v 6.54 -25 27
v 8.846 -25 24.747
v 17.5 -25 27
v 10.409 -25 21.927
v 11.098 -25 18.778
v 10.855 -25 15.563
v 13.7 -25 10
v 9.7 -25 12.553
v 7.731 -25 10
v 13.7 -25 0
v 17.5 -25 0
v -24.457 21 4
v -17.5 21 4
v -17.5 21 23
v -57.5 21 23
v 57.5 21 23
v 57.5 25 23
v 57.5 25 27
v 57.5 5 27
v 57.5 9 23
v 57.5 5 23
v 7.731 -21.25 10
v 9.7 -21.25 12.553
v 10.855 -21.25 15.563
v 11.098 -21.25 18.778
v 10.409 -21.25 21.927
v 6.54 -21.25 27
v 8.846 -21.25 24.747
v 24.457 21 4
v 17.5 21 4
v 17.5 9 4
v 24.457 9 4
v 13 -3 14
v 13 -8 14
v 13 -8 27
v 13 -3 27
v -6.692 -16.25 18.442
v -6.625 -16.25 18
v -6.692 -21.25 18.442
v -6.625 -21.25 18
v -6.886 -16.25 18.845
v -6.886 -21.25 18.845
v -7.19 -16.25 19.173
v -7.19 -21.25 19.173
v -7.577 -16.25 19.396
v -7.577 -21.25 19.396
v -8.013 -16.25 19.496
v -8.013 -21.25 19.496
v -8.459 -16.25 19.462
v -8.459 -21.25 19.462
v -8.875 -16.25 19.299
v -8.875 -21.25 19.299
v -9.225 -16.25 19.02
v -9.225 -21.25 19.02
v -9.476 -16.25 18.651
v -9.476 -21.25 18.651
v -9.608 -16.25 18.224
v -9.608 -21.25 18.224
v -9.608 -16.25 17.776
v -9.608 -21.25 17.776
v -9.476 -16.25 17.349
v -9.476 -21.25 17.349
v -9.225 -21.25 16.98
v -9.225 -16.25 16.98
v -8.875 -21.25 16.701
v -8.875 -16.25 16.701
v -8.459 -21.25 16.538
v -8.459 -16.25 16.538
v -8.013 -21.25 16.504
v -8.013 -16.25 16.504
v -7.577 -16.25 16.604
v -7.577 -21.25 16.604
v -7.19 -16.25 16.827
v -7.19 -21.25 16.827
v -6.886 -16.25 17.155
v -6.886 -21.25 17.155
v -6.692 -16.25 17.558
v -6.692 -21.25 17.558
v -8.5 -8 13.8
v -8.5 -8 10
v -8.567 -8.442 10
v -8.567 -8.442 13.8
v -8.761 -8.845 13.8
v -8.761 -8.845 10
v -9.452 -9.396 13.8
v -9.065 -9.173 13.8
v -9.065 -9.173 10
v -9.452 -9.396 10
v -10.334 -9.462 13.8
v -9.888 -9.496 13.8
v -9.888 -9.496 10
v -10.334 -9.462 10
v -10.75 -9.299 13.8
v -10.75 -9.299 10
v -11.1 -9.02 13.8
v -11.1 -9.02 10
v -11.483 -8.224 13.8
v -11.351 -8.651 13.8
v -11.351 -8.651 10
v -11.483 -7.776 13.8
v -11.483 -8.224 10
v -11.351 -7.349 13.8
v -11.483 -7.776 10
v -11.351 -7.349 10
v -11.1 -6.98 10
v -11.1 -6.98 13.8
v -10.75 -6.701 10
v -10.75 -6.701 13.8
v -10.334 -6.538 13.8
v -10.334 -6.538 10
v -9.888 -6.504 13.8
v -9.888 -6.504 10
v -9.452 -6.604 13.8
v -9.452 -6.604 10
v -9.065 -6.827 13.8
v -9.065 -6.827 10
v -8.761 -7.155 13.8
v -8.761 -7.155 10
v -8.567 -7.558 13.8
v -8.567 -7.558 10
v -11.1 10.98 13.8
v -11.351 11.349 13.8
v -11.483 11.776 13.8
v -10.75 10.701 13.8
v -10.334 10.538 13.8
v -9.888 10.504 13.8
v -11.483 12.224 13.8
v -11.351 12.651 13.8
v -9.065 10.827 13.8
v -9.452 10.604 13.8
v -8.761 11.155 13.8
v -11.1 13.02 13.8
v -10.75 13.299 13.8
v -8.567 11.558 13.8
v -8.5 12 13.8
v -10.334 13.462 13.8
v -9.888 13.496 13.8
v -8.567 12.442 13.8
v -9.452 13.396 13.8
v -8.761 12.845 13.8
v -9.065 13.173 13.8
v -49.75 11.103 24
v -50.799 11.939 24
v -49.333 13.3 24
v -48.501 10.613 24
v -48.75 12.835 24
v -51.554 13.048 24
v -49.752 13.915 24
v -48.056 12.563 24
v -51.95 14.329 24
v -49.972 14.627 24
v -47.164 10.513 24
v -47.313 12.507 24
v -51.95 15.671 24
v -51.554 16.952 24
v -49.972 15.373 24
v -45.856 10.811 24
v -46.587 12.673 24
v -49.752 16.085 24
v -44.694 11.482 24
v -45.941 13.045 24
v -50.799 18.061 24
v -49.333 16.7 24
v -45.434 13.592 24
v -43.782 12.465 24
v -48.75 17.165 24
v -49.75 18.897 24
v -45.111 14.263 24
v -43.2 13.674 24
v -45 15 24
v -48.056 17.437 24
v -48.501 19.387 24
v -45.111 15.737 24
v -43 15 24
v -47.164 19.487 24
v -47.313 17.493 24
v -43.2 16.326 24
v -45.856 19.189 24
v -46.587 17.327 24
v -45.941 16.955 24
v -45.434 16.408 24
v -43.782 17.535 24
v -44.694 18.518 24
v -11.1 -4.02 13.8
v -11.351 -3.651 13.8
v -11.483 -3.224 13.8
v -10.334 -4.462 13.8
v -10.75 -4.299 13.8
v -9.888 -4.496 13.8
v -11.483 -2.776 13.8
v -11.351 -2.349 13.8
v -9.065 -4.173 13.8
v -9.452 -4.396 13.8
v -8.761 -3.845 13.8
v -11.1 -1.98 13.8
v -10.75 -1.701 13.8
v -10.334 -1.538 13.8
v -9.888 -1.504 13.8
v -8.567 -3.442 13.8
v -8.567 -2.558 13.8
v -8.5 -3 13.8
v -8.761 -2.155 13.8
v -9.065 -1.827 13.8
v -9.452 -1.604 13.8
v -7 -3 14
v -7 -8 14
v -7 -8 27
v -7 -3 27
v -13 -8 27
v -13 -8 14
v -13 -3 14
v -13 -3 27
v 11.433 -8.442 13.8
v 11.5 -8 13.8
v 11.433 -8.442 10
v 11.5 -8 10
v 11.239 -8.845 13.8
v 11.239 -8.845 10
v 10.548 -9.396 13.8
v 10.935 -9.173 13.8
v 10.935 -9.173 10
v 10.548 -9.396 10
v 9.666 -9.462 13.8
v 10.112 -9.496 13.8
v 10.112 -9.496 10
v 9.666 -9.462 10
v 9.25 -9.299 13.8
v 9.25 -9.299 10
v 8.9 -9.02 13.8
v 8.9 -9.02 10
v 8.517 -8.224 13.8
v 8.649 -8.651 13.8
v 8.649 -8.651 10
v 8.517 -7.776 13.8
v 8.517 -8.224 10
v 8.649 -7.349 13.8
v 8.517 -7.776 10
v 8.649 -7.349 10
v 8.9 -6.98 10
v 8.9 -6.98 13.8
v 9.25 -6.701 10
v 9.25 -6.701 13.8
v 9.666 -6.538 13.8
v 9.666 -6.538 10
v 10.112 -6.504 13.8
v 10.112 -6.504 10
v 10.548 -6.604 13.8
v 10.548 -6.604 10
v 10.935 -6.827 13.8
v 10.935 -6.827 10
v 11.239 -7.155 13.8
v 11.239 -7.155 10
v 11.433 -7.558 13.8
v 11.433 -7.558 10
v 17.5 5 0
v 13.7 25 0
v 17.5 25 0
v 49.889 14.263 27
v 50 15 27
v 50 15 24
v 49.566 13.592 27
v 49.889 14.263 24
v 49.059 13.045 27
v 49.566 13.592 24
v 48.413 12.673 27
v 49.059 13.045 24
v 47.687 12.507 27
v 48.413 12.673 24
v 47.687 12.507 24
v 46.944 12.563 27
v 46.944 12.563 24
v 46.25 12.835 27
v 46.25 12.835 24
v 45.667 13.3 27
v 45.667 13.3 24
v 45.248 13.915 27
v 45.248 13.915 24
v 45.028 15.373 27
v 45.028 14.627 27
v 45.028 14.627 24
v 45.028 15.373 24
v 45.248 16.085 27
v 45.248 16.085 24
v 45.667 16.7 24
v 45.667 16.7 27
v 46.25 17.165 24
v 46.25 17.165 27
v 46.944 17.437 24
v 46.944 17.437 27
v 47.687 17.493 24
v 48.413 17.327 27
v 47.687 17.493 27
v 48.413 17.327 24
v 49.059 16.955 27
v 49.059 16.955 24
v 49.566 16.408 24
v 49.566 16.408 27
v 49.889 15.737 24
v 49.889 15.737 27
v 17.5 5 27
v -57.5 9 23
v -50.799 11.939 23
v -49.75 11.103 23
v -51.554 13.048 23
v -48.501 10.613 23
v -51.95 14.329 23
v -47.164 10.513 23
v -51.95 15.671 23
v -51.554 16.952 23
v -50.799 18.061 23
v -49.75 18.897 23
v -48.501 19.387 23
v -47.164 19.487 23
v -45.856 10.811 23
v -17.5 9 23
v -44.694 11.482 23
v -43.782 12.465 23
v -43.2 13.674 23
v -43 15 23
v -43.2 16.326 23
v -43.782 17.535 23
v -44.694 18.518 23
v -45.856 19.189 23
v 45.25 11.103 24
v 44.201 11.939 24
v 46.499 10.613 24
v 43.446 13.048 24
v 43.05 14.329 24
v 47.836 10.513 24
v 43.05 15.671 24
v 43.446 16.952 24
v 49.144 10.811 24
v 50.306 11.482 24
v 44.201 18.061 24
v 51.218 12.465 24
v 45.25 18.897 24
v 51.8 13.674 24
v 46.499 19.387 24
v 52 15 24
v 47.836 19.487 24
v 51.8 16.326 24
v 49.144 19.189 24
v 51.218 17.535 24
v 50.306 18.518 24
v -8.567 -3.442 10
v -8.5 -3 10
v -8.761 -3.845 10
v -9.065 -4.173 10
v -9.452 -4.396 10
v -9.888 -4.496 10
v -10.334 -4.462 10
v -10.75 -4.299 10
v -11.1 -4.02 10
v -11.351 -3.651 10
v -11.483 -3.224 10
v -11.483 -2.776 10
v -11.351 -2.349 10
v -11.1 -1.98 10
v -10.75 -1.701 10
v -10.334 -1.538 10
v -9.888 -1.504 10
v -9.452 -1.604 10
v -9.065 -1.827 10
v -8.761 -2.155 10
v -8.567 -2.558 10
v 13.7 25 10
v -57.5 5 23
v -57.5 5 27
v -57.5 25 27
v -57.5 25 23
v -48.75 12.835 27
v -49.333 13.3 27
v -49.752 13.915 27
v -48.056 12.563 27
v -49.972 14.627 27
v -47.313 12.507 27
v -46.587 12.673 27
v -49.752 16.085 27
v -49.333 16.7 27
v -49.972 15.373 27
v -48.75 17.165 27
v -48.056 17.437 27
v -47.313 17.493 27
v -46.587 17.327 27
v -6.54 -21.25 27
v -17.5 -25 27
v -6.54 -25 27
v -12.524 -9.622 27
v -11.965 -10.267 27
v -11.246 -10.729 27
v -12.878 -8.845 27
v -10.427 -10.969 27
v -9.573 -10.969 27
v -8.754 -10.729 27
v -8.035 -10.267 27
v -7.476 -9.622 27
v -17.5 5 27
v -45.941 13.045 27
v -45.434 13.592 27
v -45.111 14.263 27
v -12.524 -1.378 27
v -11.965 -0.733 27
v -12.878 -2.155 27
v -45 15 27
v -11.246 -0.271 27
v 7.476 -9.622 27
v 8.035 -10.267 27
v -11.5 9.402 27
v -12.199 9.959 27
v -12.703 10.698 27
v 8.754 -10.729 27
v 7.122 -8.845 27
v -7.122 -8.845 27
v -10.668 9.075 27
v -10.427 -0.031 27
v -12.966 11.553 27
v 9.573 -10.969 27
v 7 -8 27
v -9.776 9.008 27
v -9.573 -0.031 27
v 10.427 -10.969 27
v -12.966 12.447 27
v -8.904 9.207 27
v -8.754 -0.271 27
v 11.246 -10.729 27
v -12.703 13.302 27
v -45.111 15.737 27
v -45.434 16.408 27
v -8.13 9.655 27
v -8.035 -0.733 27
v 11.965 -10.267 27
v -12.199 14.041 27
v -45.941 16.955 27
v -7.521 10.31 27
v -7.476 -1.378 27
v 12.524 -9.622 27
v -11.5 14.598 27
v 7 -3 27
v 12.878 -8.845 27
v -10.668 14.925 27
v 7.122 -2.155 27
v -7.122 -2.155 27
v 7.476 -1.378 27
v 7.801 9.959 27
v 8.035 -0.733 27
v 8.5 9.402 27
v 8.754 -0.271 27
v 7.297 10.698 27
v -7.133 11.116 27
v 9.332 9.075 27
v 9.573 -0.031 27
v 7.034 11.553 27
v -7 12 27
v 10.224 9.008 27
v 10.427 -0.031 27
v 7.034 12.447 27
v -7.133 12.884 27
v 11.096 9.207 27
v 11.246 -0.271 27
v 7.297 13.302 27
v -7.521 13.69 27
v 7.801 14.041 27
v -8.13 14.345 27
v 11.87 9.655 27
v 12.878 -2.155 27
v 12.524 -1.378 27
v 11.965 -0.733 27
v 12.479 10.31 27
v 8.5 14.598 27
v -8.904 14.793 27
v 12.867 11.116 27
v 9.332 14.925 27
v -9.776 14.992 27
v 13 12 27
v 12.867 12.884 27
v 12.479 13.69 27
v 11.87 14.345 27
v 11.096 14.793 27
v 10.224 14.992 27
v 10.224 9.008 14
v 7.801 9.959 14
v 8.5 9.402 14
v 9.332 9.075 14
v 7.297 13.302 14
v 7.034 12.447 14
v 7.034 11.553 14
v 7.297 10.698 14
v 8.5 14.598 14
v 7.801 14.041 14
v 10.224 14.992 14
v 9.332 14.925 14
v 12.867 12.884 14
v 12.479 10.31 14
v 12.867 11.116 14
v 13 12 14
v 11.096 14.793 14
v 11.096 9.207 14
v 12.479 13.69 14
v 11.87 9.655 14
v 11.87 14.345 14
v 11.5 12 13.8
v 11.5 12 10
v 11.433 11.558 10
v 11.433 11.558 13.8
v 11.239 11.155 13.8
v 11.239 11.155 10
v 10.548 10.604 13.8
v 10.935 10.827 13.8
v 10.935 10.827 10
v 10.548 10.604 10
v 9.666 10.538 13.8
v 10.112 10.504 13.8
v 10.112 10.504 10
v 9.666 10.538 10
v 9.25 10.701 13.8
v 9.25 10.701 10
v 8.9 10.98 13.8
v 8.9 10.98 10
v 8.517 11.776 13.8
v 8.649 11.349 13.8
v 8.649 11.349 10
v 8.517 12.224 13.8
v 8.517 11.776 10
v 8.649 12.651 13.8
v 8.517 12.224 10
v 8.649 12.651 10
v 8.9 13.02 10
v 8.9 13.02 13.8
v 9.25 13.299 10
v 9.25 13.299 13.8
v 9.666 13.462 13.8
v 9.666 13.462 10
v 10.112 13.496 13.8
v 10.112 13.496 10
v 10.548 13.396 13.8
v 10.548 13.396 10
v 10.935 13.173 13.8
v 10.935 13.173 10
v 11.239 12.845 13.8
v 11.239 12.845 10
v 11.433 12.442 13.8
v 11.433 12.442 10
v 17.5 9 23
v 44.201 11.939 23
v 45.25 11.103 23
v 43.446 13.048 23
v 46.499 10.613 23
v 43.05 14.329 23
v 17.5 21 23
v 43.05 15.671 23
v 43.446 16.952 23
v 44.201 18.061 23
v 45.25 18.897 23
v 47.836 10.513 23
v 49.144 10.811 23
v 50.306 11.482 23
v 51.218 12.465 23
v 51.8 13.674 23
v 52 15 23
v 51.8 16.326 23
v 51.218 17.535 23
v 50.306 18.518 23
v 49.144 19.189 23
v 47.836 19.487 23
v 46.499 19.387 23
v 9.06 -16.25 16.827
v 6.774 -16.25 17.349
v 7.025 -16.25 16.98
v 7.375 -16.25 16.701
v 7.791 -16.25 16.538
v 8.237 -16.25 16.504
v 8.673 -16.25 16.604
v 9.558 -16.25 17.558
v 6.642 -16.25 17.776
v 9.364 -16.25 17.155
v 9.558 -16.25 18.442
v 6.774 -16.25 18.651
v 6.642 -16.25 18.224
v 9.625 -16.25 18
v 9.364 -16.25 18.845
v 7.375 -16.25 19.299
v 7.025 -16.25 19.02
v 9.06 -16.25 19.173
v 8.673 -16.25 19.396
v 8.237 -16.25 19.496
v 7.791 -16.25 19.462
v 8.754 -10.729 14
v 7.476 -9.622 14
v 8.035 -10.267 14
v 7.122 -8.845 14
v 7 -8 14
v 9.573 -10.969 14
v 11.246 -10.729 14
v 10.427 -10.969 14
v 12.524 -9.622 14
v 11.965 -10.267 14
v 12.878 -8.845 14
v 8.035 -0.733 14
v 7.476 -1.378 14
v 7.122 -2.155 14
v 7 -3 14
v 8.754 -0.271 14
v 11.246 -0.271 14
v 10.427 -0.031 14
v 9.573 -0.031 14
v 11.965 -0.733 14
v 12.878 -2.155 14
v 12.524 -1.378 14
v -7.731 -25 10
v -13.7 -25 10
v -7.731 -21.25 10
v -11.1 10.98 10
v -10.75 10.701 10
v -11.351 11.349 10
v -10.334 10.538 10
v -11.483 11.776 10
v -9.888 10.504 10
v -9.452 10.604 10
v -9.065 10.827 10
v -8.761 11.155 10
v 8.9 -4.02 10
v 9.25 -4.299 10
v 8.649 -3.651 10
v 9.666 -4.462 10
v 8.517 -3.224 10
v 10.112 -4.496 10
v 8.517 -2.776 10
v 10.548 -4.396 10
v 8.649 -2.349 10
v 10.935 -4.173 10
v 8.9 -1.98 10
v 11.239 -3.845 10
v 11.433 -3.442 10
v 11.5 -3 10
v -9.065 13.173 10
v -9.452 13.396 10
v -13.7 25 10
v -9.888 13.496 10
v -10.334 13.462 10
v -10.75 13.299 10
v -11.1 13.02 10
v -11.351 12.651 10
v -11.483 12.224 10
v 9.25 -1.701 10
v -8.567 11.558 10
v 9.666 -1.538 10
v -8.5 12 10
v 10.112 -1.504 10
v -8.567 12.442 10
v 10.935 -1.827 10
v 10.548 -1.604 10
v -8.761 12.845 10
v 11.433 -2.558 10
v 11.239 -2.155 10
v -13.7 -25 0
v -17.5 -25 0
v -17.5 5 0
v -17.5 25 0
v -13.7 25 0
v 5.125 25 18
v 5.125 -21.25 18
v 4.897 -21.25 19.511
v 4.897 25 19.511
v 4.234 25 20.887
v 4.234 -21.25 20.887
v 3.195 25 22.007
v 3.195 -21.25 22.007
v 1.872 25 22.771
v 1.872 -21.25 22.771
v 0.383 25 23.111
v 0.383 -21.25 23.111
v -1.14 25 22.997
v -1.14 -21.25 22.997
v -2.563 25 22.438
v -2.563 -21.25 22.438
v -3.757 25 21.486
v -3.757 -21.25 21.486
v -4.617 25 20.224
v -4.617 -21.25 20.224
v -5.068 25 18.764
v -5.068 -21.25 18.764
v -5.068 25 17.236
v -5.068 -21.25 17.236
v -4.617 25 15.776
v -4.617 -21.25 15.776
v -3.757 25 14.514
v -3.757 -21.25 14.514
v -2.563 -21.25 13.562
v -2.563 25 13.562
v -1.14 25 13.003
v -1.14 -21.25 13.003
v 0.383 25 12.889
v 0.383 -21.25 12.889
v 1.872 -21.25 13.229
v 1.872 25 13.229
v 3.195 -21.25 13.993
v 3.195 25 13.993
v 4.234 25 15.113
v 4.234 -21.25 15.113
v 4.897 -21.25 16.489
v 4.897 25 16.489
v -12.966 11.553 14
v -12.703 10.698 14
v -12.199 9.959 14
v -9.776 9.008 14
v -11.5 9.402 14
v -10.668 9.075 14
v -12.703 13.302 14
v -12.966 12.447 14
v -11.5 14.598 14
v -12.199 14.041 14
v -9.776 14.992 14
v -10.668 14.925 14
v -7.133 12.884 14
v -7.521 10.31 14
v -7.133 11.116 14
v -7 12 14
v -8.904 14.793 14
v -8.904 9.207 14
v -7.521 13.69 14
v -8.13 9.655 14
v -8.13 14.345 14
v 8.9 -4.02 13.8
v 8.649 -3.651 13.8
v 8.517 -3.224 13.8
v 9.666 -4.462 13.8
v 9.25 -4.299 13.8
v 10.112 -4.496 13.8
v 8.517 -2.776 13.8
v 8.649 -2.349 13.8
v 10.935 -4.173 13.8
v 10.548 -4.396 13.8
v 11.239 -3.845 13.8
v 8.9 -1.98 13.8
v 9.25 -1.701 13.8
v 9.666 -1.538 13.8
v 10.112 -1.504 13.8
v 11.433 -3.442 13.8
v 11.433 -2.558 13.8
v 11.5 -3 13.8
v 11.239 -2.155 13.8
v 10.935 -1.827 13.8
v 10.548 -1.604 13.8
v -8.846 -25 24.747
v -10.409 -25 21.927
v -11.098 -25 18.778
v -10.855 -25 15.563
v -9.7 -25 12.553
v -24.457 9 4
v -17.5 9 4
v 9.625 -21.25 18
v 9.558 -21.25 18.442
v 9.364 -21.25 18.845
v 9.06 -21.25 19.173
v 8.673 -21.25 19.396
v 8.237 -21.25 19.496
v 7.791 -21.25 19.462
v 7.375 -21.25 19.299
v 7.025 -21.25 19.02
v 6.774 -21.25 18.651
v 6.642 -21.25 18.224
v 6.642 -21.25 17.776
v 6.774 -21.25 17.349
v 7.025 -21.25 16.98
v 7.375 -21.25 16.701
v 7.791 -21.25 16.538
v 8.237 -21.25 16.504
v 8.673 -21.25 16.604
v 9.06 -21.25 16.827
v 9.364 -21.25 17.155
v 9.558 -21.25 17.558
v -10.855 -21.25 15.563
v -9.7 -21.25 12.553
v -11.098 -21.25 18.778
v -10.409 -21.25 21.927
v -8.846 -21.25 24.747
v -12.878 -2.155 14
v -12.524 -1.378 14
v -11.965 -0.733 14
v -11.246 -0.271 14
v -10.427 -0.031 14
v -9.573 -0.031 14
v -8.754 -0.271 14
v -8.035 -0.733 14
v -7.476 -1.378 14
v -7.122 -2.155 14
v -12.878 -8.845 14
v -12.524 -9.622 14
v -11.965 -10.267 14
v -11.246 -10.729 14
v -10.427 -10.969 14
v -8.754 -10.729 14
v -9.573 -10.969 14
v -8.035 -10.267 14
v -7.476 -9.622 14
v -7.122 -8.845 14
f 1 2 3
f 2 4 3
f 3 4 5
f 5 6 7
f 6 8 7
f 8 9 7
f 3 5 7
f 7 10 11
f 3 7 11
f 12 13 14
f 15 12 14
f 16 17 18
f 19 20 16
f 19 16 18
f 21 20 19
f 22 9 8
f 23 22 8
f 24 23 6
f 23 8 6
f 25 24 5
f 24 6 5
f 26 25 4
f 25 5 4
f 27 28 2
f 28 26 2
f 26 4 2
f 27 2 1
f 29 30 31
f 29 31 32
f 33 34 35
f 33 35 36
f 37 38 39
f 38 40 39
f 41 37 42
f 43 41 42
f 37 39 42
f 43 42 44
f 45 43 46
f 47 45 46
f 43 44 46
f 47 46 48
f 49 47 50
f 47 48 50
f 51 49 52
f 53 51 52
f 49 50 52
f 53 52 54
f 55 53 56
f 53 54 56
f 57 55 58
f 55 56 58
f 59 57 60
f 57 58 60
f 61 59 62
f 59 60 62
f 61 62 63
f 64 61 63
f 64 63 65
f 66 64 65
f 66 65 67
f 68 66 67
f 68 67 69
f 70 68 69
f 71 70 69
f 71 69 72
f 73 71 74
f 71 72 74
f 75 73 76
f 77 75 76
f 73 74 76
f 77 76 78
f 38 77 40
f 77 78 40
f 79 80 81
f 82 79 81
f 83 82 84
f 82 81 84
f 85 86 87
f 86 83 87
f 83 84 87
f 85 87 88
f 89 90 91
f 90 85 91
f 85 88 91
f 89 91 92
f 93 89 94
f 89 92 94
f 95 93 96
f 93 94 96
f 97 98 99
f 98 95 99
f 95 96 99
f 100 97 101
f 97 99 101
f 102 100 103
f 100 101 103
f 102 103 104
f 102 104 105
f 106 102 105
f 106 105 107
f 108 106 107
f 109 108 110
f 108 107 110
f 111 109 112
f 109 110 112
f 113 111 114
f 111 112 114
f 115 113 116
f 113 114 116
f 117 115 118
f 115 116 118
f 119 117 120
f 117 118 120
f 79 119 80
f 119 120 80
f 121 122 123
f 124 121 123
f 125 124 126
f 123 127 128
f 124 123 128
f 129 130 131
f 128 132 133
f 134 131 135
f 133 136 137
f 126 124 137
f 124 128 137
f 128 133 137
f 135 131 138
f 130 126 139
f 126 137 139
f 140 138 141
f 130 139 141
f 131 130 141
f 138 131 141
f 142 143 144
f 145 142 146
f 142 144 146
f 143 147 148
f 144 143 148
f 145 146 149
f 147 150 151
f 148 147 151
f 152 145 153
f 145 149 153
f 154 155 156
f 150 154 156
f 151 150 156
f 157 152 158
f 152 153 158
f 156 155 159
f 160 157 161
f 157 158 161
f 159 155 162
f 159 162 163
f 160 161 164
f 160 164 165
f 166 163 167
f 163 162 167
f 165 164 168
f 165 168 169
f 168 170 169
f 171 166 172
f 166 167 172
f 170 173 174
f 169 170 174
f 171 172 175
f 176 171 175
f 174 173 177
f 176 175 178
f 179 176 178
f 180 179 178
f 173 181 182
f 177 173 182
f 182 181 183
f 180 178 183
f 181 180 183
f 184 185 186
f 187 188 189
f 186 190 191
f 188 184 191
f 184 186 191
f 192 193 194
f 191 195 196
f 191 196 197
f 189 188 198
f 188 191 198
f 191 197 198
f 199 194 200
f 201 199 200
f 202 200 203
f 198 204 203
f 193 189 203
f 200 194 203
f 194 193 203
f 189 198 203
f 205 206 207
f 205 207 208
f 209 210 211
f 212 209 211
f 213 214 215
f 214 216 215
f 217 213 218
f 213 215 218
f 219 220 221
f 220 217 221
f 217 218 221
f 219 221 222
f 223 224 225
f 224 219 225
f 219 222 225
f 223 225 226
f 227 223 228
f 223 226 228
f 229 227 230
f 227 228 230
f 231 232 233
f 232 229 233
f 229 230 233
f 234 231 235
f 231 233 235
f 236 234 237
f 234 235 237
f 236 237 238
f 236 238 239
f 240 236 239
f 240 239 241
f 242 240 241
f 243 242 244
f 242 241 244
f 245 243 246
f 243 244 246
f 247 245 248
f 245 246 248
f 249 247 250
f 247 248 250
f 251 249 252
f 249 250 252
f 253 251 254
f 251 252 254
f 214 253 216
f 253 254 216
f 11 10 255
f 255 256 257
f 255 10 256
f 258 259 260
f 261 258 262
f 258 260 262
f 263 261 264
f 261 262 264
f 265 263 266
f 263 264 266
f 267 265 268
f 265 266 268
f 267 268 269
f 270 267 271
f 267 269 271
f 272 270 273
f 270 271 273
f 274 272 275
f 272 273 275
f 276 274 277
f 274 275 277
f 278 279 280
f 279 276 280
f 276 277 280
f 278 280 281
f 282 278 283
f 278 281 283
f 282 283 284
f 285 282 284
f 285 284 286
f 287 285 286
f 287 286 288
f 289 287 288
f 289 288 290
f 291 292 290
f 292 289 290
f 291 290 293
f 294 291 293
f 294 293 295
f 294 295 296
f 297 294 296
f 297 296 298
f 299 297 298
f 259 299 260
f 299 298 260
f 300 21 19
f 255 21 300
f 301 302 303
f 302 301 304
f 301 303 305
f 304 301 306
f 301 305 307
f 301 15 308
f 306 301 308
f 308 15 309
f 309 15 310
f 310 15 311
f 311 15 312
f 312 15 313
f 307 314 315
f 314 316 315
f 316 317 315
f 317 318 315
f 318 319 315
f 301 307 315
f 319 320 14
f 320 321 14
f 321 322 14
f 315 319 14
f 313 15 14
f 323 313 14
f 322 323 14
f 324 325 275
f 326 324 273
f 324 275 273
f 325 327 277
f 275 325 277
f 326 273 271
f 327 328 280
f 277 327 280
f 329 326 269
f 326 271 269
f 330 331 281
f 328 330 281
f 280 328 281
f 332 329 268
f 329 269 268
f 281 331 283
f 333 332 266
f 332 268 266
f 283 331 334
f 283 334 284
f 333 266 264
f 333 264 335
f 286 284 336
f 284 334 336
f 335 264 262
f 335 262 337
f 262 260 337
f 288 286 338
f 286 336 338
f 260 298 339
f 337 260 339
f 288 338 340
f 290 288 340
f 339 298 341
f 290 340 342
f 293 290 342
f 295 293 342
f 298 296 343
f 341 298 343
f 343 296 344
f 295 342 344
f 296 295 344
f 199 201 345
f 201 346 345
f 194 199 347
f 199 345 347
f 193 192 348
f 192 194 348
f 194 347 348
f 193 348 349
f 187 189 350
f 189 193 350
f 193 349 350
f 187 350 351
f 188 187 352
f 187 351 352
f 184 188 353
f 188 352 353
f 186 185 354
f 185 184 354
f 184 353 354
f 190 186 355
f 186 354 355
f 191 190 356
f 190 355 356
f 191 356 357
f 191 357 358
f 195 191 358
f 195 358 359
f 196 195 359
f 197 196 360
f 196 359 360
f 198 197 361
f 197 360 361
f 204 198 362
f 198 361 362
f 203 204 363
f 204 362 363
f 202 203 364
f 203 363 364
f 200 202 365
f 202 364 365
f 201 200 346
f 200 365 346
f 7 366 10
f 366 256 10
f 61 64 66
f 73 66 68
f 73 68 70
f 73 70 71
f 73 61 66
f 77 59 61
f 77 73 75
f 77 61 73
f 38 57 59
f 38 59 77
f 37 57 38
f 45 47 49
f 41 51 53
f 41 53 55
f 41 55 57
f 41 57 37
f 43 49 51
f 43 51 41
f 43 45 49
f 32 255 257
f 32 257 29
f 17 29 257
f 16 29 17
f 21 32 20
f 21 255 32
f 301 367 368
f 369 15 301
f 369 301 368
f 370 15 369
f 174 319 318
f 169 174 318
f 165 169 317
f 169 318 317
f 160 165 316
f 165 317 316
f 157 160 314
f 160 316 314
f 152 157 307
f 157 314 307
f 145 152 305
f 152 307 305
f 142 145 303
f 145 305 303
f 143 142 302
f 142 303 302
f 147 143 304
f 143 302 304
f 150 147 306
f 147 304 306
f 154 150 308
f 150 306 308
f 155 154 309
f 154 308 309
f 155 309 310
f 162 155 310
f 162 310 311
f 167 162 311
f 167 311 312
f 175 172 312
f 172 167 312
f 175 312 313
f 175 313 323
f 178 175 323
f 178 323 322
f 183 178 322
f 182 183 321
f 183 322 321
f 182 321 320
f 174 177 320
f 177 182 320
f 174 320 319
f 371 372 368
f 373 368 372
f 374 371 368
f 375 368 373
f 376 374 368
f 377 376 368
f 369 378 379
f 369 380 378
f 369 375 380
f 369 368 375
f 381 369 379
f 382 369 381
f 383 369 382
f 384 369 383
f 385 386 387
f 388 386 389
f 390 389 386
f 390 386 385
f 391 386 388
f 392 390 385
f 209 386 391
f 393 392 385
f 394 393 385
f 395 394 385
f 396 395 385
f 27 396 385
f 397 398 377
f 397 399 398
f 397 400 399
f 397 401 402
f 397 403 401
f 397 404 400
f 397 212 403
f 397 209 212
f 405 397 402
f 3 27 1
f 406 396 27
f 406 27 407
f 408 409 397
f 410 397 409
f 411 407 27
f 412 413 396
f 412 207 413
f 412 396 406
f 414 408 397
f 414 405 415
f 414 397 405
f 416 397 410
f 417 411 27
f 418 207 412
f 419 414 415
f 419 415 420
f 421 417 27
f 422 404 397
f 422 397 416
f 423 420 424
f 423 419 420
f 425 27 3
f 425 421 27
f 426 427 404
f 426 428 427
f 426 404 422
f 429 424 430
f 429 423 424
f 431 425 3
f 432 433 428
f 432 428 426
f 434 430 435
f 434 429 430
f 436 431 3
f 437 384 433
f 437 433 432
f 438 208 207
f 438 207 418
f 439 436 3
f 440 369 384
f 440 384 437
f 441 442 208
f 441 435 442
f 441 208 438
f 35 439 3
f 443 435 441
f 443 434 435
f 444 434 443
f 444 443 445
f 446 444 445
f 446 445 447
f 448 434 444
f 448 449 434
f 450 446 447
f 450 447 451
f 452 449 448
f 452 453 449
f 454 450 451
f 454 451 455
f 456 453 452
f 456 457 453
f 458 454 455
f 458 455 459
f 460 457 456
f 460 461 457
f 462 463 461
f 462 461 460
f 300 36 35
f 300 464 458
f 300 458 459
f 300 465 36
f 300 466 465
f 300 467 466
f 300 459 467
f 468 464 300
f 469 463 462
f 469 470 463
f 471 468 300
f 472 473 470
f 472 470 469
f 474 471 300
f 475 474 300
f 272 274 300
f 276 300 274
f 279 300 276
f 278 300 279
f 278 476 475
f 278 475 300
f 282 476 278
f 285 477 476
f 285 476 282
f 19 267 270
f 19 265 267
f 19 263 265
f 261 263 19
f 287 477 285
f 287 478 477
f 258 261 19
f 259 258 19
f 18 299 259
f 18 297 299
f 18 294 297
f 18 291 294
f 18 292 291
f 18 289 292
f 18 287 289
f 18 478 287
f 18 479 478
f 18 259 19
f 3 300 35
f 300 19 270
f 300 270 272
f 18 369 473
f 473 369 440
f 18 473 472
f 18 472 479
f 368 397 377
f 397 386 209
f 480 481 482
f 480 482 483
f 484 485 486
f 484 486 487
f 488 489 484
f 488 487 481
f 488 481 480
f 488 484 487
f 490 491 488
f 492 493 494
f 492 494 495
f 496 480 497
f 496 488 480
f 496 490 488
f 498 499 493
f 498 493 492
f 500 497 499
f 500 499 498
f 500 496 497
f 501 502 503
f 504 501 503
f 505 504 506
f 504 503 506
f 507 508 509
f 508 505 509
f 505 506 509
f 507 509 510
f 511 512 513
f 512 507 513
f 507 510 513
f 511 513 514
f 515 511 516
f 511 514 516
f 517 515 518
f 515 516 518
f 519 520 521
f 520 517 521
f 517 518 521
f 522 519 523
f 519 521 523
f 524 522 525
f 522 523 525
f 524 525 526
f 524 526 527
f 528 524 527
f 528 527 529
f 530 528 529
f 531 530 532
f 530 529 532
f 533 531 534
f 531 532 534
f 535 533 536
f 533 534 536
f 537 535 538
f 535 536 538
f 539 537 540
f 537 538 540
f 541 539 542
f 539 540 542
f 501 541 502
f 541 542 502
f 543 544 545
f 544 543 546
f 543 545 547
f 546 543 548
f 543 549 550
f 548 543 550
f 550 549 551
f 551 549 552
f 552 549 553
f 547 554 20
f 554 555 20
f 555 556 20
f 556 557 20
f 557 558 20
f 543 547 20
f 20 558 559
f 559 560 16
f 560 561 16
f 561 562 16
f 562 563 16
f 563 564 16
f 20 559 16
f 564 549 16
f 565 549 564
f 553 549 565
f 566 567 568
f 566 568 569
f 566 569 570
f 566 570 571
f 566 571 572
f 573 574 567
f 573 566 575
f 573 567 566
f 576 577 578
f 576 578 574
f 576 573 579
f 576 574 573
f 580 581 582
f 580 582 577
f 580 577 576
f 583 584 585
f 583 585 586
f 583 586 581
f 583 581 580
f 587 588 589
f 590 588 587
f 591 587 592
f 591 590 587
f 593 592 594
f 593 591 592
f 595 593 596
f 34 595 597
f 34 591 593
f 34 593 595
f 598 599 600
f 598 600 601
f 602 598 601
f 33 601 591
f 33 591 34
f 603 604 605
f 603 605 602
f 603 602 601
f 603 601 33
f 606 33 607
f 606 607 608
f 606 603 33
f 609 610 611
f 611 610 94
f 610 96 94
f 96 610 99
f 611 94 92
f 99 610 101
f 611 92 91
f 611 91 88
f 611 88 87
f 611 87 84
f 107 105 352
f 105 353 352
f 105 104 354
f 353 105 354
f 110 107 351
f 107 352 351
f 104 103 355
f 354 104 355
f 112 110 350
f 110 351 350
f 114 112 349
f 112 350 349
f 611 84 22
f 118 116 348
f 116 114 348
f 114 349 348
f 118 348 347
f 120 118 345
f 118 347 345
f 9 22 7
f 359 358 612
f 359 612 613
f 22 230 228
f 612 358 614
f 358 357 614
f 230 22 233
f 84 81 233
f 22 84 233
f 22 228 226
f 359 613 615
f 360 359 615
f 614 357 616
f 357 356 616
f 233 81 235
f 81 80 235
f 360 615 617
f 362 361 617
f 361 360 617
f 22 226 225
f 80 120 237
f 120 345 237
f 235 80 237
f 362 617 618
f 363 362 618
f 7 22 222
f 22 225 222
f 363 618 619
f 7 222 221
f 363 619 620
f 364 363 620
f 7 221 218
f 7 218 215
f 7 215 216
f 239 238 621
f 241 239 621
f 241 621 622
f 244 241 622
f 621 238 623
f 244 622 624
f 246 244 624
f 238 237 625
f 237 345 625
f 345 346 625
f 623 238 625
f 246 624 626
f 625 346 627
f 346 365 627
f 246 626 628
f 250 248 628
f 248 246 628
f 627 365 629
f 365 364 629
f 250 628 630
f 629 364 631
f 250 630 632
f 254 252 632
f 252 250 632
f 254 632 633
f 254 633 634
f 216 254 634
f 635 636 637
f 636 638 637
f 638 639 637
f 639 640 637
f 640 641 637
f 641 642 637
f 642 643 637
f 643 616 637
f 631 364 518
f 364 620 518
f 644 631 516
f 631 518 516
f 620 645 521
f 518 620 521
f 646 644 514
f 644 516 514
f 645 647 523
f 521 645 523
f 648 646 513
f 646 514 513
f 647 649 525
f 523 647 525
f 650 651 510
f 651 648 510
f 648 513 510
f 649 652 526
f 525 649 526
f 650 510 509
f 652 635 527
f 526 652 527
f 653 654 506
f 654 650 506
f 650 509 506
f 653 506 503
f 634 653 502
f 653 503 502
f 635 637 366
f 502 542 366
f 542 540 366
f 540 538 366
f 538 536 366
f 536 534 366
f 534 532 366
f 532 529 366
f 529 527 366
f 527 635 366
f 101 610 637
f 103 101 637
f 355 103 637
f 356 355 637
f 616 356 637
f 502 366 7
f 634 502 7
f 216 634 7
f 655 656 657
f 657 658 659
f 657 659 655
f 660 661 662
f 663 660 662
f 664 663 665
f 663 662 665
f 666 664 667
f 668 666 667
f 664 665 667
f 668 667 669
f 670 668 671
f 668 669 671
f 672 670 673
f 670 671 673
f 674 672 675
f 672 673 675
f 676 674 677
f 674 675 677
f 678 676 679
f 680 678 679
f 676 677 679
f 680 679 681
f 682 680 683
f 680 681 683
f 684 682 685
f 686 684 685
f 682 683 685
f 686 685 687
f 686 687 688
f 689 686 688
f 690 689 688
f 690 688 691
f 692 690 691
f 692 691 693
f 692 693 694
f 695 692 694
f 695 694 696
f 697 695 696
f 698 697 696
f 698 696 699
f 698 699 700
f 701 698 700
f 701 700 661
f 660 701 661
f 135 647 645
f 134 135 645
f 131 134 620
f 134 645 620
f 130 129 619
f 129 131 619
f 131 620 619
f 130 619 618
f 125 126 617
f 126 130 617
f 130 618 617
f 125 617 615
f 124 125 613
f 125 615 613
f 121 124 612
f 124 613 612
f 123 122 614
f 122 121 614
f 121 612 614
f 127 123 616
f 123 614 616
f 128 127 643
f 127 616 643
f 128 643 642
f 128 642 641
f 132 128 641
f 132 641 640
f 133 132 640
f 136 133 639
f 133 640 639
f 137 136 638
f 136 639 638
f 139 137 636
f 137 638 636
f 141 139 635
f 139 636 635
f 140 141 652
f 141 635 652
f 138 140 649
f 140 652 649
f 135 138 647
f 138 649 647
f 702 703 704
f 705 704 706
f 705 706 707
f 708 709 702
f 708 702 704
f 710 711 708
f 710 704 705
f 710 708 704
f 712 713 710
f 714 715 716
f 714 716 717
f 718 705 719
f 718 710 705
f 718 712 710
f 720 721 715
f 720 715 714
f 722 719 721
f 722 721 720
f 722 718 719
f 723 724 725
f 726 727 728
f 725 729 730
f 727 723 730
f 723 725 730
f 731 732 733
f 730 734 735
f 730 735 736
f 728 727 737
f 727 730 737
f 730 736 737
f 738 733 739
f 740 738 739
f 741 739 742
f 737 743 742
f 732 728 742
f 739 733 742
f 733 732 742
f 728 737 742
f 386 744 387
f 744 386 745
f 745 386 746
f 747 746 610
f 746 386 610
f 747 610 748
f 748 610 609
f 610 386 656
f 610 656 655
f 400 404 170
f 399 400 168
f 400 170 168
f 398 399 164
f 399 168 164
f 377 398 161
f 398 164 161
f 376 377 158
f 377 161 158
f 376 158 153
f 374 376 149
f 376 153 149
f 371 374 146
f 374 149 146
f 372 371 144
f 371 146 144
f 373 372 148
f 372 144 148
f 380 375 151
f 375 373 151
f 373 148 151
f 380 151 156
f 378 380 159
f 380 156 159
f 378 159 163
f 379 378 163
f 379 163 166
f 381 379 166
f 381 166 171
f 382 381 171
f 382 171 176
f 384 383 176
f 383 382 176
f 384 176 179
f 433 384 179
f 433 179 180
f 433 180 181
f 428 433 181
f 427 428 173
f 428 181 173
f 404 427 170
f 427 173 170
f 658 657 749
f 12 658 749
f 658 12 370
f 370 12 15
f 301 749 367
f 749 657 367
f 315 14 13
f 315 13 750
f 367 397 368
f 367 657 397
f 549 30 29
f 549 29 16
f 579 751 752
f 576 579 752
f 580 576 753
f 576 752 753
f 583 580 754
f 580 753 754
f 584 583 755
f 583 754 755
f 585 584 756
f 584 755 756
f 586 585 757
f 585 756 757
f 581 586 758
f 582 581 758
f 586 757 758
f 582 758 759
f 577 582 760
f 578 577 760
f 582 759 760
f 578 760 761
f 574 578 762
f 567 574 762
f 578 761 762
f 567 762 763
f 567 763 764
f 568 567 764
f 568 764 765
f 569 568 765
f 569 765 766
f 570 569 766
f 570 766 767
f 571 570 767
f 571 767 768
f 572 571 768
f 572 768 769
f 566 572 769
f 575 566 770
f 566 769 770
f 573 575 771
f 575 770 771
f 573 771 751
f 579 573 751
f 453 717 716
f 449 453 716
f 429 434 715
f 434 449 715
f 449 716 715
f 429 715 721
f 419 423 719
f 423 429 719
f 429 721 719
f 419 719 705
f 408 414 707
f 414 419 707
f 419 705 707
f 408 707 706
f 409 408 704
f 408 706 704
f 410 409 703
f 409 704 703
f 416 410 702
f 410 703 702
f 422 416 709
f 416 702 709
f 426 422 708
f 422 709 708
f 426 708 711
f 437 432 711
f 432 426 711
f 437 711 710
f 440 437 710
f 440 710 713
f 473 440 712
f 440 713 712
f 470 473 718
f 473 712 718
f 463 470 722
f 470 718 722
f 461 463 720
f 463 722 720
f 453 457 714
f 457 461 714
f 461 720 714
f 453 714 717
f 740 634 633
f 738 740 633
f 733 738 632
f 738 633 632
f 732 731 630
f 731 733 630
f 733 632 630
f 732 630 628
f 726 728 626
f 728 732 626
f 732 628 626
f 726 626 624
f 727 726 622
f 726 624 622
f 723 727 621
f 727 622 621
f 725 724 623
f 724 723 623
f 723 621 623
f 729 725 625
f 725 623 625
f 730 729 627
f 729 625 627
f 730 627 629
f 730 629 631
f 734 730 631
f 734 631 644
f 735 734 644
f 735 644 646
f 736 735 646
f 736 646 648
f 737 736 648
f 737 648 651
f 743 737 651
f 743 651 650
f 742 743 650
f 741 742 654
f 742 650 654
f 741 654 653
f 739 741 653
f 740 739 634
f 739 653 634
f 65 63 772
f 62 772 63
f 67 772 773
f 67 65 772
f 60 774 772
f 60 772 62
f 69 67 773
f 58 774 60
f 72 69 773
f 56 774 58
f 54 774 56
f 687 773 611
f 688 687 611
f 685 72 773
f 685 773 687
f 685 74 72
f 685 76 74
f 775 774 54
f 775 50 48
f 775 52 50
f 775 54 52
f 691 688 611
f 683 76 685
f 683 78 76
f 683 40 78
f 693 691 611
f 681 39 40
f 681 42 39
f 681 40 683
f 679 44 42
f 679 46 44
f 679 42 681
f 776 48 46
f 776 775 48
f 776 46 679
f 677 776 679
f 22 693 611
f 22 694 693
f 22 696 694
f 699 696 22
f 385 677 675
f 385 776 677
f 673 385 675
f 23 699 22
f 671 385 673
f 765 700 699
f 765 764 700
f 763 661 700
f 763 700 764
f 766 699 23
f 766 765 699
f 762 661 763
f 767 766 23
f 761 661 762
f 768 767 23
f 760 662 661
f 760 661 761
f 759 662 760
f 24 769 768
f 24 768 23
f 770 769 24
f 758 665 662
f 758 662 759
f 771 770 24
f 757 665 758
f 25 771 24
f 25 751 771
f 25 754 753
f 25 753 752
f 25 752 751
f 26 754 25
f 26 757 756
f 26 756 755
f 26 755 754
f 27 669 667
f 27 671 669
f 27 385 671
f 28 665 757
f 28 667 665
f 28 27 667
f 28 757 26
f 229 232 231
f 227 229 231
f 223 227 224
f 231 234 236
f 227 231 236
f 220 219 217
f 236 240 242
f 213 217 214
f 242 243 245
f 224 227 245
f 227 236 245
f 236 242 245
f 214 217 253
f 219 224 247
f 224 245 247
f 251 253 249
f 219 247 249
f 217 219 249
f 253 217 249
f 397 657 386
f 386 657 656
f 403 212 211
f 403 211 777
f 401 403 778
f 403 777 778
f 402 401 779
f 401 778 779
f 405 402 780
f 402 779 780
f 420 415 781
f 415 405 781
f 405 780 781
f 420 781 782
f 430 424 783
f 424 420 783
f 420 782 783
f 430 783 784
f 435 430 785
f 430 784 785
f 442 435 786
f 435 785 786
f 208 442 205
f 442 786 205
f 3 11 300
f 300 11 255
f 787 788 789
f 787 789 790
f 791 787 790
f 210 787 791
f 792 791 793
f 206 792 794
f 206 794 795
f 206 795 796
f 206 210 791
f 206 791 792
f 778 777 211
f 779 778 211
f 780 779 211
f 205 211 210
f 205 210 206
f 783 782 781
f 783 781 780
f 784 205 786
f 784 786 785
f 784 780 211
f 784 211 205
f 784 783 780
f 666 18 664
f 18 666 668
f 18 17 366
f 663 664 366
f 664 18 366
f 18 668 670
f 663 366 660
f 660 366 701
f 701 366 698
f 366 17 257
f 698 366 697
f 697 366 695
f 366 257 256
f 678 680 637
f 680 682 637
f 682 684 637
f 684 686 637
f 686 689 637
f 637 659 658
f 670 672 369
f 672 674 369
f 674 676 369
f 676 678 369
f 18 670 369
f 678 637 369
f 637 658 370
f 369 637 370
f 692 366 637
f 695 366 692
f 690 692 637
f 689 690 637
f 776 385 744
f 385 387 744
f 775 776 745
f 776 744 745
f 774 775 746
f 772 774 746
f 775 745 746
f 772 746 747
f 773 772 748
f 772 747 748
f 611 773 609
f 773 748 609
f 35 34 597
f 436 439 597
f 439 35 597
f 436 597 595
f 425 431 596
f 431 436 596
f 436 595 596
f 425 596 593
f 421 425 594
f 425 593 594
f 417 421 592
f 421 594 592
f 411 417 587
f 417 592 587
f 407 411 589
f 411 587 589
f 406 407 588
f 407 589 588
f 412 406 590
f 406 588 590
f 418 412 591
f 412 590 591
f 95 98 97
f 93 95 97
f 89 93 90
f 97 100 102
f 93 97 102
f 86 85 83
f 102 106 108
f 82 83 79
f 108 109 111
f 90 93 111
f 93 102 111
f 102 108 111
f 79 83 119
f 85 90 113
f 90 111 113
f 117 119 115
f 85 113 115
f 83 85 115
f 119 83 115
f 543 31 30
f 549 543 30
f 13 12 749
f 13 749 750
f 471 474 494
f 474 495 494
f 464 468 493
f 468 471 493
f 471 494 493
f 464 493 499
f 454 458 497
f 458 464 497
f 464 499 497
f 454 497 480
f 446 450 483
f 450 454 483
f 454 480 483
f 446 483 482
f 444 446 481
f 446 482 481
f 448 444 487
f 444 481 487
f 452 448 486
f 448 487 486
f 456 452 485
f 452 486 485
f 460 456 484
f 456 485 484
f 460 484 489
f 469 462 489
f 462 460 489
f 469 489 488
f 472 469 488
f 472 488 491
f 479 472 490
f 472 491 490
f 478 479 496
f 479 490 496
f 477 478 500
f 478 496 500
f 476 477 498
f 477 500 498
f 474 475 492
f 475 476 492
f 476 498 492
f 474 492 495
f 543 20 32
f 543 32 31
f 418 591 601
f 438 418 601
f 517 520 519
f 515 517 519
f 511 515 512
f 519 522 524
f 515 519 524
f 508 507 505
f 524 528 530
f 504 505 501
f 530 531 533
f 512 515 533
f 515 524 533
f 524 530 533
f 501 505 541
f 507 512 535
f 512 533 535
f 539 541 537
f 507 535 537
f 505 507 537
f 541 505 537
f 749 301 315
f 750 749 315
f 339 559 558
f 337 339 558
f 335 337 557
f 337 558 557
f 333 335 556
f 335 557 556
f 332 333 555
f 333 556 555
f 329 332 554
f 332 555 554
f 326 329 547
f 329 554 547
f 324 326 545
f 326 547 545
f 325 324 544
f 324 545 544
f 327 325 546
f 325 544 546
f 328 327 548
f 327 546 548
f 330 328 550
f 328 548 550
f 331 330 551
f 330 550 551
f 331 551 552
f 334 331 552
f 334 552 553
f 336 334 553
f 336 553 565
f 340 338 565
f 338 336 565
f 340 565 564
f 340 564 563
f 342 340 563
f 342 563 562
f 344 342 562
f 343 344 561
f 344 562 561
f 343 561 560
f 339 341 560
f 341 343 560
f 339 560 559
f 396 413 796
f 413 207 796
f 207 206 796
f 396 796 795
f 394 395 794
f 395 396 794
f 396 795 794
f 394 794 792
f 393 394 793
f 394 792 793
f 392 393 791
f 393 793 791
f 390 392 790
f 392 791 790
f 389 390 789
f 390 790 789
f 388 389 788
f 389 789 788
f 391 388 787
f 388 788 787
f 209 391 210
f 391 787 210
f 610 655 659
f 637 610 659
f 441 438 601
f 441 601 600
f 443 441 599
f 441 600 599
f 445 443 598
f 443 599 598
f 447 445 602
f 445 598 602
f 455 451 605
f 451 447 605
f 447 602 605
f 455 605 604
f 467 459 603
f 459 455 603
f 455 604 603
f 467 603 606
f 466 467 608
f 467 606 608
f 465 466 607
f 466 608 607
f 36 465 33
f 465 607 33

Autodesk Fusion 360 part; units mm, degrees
sketch "Sketch1" plane through (0, 0, 0) normal (0, 0, 1) x (1, 0, 0)
  line L0 (17.5, 25) -> (-17.5, 25)
  line L1 (-17.5, 25) -> (-17.5, -25)
  line L2 (-17.5, -25) -> (17.5, -25)
  line L3 (17.5, -25) -> (17.5, 25)
  line L4 (17.5, 25) -> (-17.5, -25) construction
  line L5 (-17.5, 25) -> (17.5, -25) construction
  line L6 (-13.7, 25) -> (13.7, 25)
  line L7 (13.7, 25) -> (13.7, -25)
  line L8 (13.7, -25) -> (-13.7, -25)
  line L9 (-13.7, -25) -> (-13.7, 25)
  line L10 (-57.5, 25) -> (57.5, 25)
  line L11 (57.5, 25) -> (57.5, 5)
  line L12 (57.5, 5) -> (-57.5, 5)
  line L13 (-57.5, 5) -> (-57.5, 25)
  line L14 (17.5, -8) -> (-17.5, -8) construction
  line L15 (17.5, 12) -> (-17.5, 12) construction
  line L16 (-10, -25) -> (-10, 25) construction
  line L17 (10, -25) -> (10, 26.6131) construction
  circle A0 centre (10, -8) radius 1.5
  circle A1 centre (10, 12) radius 1.5
  circle A2 centre (-10, 12) radius 1.5
  circle A3 centre (-10, -8) radius 1.5
  circle A4 centre (10, 12) radius 3
  circle A5 centre (-10, 12) radius 3
  circle A6 centre (-10, -8) radius 3
  circle A7 centre (10, -8) radius 3
  circle A8 centre (47.5, 15) radius 2.5
  circle A9 centre (47.5, 15) radius 4.5
  circle A10 centre (-47.5, 15) radius 2.5
  circle A11 centre (-47.5, 15) radius 4.5
  line L18 (-17.5, 21) -> (-57.5, 21)
  line L19 (-57.5, 21) -> (-57.5, 9)
  line L20 (-57.5, 9) -> (-17.5, 9)
  line L21 (-17.5, 9) -> (-17.5, 21)
  line L22 (57.5, 9) -> (17.5, 9)
  line L23 (17.5, 9) -> (17.5, 21)
  line L24 (17.5, 21) -> (57.5, 21)
  line L25 (57.5, 21) -> (57.5, 9)
  circle A12 centre (10, -3) radius 1.5
  circle A13 centre (10, -3) radius 3
  circle A14 centre (-10, -3) radius 3
  circle A15 centre (-10, -3) radius 1.5
  line L26 (-13, -8) -> (-13, -3)
  line L27 (-7, -8) -> (-7, -3)
  line L28 (7, -8) -> (7, -3)
  line L29 (13, -8) -> (13, -3)
  point P0 (-47.5, 15)
  point P1 (47.5, 15)
  dimension "d1" = 35
  dimension "d2" = 50
  dimension "d5" = 27.4
  dimension "d6" = 50
  dimension "d7" = 3.8
  dimension "d10" = 115
  dimension "d11" = 20
  dimension "d12" = 40
  dimension "d16" = 7.5
  dimension "d17" = 7.5
  dimension "d19" = 13
  dimension "d20" = 3
  dimension "d21" = 3
  dimension "d22" = 3
  dimension "d23" = 3
  dimension "d30" = 6
  dimension "d31" = 6
  dimension "d32" = 6
  dimension "d33" = 6
  dimension "d40" = 5
  dimension "d41" = 9
  dimension "d42" = 5
  dimension "d43" = 9
  dimension "d52" = 40
  dimension "d53" = 12
  dimension "d54" = 12
  dimension "d71" = 20
  dimension "d81" = 10
  dimension "d82" = 10
  dimension "d83" = 10
  dimension "d84" = 10
  dimension "d94" = 3
  dimension "d95" = 3
  dimension "d96" = 6
  dimension "d97" = 6
  dimension "d98" = 5
extrude "Extrude1" add sketch "Sketch1" along normal blind 27 contours L0 L3 L7 L10 L12 L23 | L0 L6 L7 L9 L10 L12 | L0 L1 L9 L10 L12 L21 | L2 L3 L7 L12 | L2 L7 L8 L9 L12 | L1 L2 L9 L12 | A0 | A1 | A2 | A3 | A4 | A5 | A6 A14 | A6 A14 L26 | A6 A14 L27 | A6 A14 | A6 A14 | A7 A13 | A7 A13 L28 | A7 A13 L29 | A7 A13 | A7 A13 | A12 | A15
extrude "Extrude2" cut sketch "Sketch1" along normal blind 10 contours L0 L6 L7 L9 L10 L12 | L2 L7 L8 L9 L12 | A0 | A1 | A2 | A3 | A4 | A5 | A6 A14 | A6 A14 L26 | A6 A14 L27 | A6 A14 | A6 A14 | A7 A13 | A7 A13 L28 | A7 A13 L29 | A7 A13 | A7 A13 | A12 | A15
extrude "Extrude3" add sketch "Sketch1" along normal blind 4 from surface at 23 contours L0 L3 L7 L10 L12 L23 | L3 L10 L11 L24 | L0 L6 L7 L9 L10 L12 | L3 L11 L22 L23 L24 L25 | L0 L1 L9 L10 L12 L21 | L3 L11 L12 L22 | L1 L10 L13 L18 | L1 L13 L18 L19 L20 L21 | L1 L12 L13 L20 | A1 | A2 | A4 | A5 | A8 | A9 | A10 | A11
extrude "Extrude6" cut sketch "Sketch1" along normal up to surface (13 mm away) from surface at 14 contours A0 | A3 | A6 A14 | A6 A14 L26 | A6 A14 L27 | A6 A14 | A6 A14 | A7 A13 | A7 A13 L28 | A7 A13 L29 | A7 A13 | A7 A13 | A12 | A15
extrude "Extrude7" cut sketch "Sketch1" along normal up to surface (13 mm away) from surface at 14 contours A1 | A2 | A4 | A5
extrude "Extrude4" cut sketch "Sketch1" along normal blind 3.8 from surface at 10 contours A0 | A3 | A12 | A15
extrude "Extrude5" cut sketch "Sketch1" along normal blind 3.8 from surface at 10 contours A1 | A2
extrude "Extrude8" cut sketch "Sketch1" along normal up to surface (4 mm away) from surface at 23 contours A8 | A10
extrude "Extrude9" cut sketch "Sketch1" along normal blind 1 from surface at 23 contours A8 | A9 | A10 | A11
extrude "Extrude10" add sketch "Sketch1" along normal up to surface (23 mm away) contours L3 L10 L11 L24 | L3 L11 L22 L23 L24 L25 | L3 L11 L12 L22 | L1 L10 L13 L18 | L1 L13 L18 L19 L20 L21 | L1 L12 L13 L20
sketch "Sketch2" plane through (0, -25, 0) normal (0, -1, 0) x (1, 0, 0)
  line L0 (-17.5, 0) -> (-17.5, 23)
  line L1 (17.5, 23) -> (17.5, 0)
  line L2 (-13.7, 0) -> (-13.7, 10)
  line L3 (-13.7, 10) -> (13.7, 10)
  line L4 (13.7, 10) -> (13.7, 0)
  line L5 (13.7, 0) -> (17.5, 0)
  line L6 (17.5, 0) -> (17.5, 27)
  line L7 (17.5, 27) -> (-17.5, 27)
  line L8 (-17.5, 27) -> (-17.5, 0)
  line L9 (-17.5, 0) -> (-13.7, 0)
  line L10 (17.5, 18) -> (-17.5, 18) construction
  line L11 (0, 23) -> (0, 10) construction
  circle A0 centre (0, 18) radius 5.125
  circle A1 centre (0, 18) radius 11.125
  line L12 (11.125, 18) -> (5.125, 18)
  line L13 (11.125, 18) -> (5.125, 18) construction
  line L14 (-5.125, 18) -> (-11.125, 18) construction
  circle A2 centre (-8.125, 18) radius 1.5
  circle A3 centre (8.125, 18) radius 1.5
  line L15 (-17.5, 27) -> (-57.5, 27)
  line L16 (-57.5, 27) -> (-57.5, 0)
  line L17 (-57.5, 0) -> (-17.5, 0)
  line L18 (-17.5, 0) -> (-17.5, 27)
  line L19 (17.5, 27) -> (57.5, 27)
  line L20 (57.5, 27) -> (57.5, 0)
  line L21 (57.5, 0) -> (17.5, 0)
  line L22 (17.5, 0) -> (17.5, 27)
  line L23 (-57.5, 27) -> (-17.5, 0) construction
  line L24 (-17.5, 27) -> (-57.5, 0) construction
  line L25 (17.5, 0) -> (57.5, 27) construction
  line L26 (17.5, 27) -> (57.5, 0) construction
  line L27 (-17.5, 23) -> (-57.5, 23)
  line L28 (-57.5, 23) -> (-57.5, 4)
  line L29 (-57.5, 4) -> (-17.5, 4)
  line L30 (-17.5, 4) -> (-17.5, 23)
  line L31 (-17.5, 23) -> (-57.5, 4) construction
  line L32 (-57.5, 23) -> (-17.5, 4) construction
  line L33 (57.5, 23) -> (17.5, 23)
  line L34 (17.5, 23) -> (17.5, 4)
  line L35 (17.5, 4) -> (57.5, 4)
  line L36 (57.5, 4) -> (57.5, 23)
  line L37 (57.5, 23) -> (17.5, 4) construction
  line L38 (17.5, 23) -> (57.5, 4) construction
  line L39 (-17.5, 0) -> (-57.5, 23)
  line L40 (17.5, 0) -> (57.5, 23)
  point P0 (-37.5, 13.5)
  point P1 (37.5, 13.5)
  dimension "d64" = 8
  dimension "d65" = 10.25
  dimension "d66" = 22.25
  dimension "d74" = 3
  dimension "d75" = 3
  dimension "d85" = 40
  dimension "d86" = 27
  dimension "d87" = 40
  dimension "d88" = 27
  dimension "d89" = 19
  dimension "d90" = 40
  dimension "d91" = 19
extrude "Extrude16" cut sketch "Sketch2" against normal up to surface (50 mm away) contours L16 L17 L29 L39 | L16 L28 L29 L39 | L20 L21 L35 L40 | L20 L35 L36 L40
extrude "Extrude14" cut sketch "Sketch2" against normal blind 3.75 contours L3 L7 A1 | A0 | L12 A3 | L12 A3 | A2
extrude "Extrude13" cut sketch "Sketch2" against normal up to surface (50 mm away) contours A0
extrude "Extrude15" cut sketch "Sketch2" against normal blind 5 from surface at -3.75 contours L12 A3 | L12 A3 | A2
extrude "Extrude11" cut sketch "Sketch1" along normal up to surface (19 mm away) from surface at 4 contours L3 L11 L22 L23 L24 L25 | L1 L13 L18 L19 L20 L21
